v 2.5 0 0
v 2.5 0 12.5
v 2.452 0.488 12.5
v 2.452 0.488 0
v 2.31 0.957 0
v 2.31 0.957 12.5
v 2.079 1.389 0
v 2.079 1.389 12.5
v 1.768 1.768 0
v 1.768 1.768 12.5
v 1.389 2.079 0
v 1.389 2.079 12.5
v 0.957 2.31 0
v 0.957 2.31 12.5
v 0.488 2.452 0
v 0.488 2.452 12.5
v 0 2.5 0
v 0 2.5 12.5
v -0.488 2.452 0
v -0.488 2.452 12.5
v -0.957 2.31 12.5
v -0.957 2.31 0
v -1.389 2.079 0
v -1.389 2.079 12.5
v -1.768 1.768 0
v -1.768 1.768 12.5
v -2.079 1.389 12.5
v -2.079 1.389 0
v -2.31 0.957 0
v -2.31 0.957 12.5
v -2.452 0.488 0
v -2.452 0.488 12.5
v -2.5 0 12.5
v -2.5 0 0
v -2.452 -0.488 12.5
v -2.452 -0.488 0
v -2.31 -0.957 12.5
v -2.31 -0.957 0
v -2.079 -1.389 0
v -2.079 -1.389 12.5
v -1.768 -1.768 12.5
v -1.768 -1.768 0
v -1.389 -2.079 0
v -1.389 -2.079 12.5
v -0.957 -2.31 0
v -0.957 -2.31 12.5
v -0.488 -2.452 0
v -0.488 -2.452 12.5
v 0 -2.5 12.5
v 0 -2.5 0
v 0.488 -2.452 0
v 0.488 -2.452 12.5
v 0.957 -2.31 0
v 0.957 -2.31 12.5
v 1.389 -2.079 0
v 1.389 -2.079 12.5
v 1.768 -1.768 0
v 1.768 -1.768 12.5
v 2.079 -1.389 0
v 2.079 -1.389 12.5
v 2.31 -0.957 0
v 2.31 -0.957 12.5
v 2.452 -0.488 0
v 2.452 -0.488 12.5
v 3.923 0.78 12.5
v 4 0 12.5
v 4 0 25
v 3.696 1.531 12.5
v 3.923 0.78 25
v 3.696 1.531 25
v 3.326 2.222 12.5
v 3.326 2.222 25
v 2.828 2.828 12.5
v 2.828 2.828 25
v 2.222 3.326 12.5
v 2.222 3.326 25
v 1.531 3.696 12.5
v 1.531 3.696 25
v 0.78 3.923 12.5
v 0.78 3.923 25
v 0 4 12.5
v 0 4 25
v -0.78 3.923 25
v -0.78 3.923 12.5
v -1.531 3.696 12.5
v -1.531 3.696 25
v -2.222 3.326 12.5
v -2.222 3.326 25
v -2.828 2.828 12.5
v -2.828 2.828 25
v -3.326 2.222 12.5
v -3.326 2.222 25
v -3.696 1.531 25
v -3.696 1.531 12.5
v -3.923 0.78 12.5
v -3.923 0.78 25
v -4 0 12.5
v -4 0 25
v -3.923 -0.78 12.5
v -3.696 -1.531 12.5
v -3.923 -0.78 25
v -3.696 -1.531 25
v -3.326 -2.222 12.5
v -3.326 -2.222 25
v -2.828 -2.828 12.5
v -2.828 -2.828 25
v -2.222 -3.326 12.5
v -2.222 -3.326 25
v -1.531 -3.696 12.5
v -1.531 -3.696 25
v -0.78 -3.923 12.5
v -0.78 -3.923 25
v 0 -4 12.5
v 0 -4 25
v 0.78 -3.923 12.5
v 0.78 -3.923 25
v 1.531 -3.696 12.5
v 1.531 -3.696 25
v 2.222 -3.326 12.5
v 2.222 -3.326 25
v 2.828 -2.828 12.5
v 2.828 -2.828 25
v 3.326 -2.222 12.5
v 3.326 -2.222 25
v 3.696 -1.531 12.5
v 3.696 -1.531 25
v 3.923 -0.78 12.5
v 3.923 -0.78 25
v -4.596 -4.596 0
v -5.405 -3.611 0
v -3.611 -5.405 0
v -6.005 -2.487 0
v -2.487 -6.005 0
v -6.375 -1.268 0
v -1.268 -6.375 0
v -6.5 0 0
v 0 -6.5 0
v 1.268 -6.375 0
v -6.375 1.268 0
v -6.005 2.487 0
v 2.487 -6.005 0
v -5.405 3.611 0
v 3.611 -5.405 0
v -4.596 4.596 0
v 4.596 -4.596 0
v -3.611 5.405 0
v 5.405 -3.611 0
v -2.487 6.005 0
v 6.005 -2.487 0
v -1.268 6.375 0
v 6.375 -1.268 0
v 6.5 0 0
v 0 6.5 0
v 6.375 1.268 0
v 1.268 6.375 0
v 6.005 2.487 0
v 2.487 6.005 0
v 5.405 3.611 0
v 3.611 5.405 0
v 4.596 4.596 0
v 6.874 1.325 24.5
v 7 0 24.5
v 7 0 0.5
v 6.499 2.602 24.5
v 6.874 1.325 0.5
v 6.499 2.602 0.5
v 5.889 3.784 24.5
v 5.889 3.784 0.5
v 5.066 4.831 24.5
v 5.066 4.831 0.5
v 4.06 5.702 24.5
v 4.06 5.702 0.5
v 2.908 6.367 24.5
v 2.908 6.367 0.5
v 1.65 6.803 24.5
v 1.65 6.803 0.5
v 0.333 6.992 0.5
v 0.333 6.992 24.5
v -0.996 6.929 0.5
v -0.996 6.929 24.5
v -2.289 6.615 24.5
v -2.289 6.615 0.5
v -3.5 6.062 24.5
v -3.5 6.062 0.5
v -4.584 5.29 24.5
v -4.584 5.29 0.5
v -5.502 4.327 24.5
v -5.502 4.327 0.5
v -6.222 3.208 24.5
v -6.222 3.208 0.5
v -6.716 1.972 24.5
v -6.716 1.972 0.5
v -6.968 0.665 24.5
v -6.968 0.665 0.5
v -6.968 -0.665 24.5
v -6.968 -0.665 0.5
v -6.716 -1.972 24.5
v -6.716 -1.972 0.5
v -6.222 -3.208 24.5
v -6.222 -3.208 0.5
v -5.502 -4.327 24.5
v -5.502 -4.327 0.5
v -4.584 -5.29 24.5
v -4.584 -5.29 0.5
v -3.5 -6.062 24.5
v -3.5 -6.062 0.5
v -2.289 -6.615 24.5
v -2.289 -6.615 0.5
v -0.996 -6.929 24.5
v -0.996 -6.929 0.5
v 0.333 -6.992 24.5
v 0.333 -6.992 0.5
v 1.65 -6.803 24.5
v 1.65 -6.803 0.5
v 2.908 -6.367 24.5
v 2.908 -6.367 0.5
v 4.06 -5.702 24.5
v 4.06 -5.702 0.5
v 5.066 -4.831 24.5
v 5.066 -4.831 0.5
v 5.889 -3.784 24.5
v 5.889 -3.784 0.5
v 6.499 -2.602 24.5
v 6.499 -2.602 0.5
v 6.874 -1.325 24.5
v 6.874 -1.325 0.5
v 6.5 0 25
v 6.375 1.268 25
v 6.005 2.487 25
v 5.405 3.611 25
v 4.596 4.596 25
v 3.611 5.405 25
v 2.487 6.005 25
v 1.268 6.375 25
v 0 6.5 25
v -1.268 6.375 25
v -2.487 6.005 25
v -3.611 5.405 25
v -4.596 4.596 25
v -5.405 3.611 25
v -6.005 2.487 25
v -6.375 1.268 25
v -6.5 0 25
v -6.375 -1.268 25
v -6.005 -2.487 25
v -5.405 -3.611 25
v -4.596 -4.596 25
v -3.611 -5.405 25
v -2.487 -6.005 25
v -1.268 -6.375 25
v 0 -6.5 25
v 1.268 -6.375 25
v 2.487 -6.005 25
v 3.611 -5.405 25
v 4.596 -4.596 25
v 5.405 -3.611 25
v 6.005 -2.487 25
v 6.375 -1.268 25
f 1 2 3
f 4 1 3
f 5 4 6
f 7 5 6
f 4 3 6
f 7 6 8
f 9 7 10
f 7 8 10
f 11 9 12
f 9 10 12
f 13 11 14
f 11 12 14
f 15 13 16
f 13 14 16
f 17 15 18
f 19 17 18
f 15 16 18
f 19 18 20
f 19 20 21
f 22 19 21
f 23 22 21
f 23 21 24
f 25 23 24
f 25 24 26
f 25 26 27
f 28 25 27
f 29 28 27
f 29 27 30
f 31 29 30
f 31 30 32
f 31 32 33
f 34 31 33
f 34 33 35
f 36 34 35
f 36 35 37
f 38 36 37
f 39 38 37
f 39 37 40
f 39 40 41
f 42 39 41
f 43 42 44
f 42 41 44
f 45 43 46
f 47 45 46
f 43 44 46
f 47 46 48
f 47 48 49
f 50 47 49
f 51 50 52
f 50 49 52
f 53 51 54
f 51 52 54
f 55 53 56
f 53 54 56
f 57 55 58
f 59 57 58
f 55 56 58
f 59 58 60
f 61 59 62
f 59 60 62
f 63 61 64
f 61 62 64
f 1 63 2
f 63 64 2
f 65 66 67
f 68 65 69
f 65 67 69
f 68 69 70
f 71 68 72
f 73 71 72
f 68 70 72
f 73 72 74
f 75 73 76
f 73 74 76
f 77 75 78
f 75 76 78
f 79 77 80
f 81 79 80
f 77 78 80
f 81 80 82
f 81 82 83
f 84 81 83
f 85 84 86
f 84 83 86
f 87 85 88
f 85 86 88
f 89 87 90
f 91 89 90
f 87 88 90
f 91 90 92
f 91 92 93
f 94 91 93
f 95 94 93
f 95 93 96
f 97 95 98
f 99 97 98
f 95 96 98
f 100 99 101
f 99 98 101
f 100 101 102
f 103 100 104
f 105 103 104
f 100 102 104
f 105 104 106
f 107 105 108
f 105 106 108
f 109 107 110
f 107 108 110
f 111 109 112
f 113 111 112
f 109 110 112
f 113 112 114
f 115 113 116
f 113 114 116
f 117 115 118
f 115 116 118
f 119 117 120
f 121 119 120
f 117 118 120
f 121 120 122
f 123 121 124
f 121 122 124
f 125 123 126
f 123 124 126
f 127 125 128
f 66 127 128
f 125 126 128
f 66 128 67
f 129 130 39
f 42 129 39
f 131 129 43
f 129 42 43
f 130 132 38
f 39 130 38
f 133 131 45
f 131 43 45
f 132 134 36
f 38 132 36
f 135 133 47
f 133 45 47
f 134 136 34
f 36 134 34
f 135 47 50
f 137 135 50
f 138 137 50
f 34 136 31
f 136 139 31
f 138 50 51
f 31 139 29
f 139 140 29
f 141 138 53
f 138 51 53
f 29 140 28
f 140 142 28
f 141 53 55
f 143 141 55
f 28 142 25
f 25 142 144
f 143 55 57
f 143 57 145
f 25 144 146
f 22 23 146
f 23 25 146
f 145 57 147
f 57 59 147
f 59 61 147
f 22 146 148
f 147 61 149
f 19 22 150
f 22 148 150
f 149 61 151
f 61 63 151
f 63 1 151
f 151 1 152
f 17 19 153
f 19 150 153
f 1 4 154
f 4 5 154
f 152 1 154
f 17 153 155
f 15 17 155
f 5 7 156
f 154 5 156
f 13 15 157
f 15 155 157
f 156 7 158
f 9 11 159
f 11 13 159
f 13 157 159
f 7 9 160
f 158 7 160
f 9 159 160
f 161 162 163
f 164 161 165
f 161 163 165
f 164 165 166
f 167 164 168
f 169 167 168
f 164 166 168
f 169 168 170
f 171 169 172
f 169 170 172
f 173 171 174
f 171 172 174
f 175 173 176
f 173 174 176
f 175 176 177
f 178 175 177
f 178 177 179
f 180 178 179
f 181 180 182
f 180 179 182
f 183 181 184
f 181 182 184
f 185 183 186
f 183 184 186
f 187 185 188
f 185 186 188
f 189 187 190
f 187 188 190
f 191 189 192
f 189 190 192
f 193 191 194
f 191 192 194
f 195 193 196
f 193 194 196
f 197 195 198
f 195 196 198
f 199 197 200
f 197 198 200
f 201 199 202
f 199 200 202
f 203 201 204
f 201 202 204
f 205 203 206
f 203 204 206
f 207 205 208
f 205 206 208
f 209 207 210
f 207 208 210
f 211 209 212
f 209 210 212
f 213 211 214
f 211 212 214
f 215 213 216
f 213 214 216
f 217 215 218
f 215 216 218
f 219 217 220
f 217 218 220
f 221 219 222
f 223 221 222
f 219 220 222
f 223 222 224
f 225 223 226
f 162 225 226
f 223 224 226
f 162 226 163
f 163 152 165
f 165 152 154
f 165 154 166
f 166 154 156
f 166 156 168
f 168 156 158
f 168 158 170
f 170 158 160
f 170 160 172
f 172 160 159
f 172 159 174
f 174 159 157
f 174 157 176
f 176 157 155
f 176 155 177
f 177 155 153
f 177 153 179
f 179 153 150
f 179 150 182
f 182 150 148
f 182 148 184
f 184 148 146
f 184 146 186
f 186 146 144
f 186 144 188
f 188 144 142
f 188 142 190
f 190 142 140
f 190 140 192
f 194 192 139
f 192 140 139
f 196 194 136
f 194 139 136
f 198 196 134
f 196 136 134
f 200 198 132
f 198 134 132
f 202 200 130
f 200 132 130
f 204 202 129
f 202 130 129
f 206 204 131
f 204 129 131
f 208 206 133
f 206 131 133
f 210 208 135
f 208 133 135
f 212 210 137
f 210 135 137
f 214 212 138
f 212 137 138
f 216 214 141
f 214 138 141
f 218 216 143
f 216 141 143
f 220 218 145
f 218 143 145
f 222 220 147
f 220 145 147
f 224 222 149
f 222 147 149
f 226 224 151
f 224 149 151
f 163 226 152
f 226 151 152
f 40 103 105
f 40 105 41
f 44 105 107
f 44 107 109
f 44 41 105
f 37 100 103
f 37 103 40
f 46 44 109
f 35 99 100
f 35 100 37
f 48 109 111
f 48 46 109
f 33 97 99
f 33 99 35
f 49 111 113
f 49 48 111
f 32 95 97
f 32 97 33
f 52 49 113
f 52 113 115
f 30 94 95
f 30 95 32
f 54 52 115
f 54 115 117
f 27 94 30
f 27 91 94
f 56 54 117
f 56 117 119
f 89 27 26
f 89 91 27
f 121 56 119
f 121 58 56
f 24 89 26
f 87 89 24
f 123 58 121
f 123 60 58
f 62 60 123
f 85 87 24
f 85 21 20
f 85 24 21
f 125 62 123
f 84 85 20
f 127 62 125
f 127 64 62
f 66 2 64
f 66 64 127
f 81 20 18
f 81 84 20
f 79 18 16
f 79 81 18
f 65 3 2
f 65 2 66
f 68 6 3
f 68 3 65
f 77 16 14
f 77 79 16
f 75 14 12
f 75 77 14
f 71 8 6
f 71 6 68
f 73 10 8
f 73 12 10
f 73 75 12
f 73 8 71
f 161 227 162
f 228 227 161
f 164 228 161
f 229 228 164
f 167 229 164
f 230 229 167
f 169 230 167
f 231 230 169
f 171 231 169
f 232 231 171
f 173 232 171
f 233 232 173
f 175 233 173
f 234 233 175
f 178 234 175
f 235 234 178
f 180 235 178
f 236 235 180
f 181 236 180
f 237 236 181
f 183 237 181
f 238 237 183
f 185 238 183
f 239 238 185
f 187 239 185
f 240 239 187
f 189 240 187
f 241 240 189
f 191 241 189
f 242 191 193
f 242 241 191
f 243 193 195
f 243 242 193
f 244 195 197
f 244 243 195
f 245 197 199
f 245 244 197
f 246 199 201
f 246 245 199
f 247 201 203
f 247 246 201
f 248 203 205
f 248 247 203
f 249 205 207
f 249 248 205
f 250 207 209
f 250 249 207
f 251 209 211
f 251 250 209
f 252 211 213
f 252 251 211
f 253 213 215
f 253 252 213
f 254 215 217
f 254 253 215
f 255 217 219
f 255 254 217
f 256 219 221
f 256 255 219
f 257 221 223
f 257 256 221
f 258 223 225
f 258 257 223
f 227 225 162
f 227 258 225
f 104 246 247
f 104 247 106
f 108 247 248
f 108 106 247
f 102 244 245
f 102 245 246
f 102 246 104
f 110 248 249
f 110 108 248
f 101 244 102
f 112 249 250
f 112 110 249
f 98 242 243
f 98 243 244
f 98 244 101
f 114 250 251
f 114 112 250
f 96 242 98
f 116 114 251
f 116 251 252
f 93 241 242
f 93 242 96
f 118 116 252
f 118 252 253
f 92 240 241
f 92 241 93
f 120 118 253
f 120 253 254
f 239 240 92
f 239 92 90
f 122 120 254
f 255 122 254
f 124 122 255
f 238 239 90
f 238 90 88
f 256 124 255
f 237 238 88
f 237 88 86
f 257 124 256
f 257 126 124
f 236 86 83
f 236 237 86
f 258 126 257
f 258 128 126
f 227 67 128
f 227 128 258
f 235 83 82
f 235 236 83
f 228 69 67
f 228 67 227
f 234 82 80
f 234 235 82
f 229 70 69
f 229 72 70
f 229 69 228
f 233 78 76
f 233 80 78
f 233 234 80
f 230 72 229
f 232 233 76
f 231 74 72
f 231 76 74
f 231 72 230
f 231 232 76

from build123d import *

# Parameters (mm, degrees)
SKETCH1_R           = 7
BOSS_EXTRUDE1_DEPTH = 25
SKETCH3_R           = 4
CUT_EXTRUDE1_DEPTH  = 12.5
SKETCH4_R           = 2.5
CUT_EXTRUDE2_DEPTH  = 14.5
CHAMFER1_SIZE       = 0.5


with BuildPart() as part:
    # Sketch1 → Boss-Extrude1 (new body)
    with BuildSketch(Plane.XY):
        Circle(SKETCH1_R)
    extrude(amount=BOSS_EXTRUDE1_DEPTH)

    # Sketch3 → Cut-Extrude1 (cut)
    with BuildSketch(Plane.XY.offset(25)):
        Circle(SKETCH3_R)
    extrude(amount=-CUT_EXTRUDE1_DEPTH, mode=Mode.SUBTRACT)

    # Sketch4 → Cut-Extrude2 (cut)
    with BuildSketch(Plane.XY.offset(12.5)):
        Circle(SKETCH4_R)
    extrude(amount=-CUT_EXTRUDE2_DEPTH, mode=Mode.SUBTRACT)

    # Chamfer1
    chamfer1_edges = [part.edges().sort_by_distance(p)[0] for p in [
        (-7, 0, 0),
        (-7, 0, 25),
    ]]
    chamfer(chamfer1_edges, length=CHAMFER1_SIZE)


solid = part.part
